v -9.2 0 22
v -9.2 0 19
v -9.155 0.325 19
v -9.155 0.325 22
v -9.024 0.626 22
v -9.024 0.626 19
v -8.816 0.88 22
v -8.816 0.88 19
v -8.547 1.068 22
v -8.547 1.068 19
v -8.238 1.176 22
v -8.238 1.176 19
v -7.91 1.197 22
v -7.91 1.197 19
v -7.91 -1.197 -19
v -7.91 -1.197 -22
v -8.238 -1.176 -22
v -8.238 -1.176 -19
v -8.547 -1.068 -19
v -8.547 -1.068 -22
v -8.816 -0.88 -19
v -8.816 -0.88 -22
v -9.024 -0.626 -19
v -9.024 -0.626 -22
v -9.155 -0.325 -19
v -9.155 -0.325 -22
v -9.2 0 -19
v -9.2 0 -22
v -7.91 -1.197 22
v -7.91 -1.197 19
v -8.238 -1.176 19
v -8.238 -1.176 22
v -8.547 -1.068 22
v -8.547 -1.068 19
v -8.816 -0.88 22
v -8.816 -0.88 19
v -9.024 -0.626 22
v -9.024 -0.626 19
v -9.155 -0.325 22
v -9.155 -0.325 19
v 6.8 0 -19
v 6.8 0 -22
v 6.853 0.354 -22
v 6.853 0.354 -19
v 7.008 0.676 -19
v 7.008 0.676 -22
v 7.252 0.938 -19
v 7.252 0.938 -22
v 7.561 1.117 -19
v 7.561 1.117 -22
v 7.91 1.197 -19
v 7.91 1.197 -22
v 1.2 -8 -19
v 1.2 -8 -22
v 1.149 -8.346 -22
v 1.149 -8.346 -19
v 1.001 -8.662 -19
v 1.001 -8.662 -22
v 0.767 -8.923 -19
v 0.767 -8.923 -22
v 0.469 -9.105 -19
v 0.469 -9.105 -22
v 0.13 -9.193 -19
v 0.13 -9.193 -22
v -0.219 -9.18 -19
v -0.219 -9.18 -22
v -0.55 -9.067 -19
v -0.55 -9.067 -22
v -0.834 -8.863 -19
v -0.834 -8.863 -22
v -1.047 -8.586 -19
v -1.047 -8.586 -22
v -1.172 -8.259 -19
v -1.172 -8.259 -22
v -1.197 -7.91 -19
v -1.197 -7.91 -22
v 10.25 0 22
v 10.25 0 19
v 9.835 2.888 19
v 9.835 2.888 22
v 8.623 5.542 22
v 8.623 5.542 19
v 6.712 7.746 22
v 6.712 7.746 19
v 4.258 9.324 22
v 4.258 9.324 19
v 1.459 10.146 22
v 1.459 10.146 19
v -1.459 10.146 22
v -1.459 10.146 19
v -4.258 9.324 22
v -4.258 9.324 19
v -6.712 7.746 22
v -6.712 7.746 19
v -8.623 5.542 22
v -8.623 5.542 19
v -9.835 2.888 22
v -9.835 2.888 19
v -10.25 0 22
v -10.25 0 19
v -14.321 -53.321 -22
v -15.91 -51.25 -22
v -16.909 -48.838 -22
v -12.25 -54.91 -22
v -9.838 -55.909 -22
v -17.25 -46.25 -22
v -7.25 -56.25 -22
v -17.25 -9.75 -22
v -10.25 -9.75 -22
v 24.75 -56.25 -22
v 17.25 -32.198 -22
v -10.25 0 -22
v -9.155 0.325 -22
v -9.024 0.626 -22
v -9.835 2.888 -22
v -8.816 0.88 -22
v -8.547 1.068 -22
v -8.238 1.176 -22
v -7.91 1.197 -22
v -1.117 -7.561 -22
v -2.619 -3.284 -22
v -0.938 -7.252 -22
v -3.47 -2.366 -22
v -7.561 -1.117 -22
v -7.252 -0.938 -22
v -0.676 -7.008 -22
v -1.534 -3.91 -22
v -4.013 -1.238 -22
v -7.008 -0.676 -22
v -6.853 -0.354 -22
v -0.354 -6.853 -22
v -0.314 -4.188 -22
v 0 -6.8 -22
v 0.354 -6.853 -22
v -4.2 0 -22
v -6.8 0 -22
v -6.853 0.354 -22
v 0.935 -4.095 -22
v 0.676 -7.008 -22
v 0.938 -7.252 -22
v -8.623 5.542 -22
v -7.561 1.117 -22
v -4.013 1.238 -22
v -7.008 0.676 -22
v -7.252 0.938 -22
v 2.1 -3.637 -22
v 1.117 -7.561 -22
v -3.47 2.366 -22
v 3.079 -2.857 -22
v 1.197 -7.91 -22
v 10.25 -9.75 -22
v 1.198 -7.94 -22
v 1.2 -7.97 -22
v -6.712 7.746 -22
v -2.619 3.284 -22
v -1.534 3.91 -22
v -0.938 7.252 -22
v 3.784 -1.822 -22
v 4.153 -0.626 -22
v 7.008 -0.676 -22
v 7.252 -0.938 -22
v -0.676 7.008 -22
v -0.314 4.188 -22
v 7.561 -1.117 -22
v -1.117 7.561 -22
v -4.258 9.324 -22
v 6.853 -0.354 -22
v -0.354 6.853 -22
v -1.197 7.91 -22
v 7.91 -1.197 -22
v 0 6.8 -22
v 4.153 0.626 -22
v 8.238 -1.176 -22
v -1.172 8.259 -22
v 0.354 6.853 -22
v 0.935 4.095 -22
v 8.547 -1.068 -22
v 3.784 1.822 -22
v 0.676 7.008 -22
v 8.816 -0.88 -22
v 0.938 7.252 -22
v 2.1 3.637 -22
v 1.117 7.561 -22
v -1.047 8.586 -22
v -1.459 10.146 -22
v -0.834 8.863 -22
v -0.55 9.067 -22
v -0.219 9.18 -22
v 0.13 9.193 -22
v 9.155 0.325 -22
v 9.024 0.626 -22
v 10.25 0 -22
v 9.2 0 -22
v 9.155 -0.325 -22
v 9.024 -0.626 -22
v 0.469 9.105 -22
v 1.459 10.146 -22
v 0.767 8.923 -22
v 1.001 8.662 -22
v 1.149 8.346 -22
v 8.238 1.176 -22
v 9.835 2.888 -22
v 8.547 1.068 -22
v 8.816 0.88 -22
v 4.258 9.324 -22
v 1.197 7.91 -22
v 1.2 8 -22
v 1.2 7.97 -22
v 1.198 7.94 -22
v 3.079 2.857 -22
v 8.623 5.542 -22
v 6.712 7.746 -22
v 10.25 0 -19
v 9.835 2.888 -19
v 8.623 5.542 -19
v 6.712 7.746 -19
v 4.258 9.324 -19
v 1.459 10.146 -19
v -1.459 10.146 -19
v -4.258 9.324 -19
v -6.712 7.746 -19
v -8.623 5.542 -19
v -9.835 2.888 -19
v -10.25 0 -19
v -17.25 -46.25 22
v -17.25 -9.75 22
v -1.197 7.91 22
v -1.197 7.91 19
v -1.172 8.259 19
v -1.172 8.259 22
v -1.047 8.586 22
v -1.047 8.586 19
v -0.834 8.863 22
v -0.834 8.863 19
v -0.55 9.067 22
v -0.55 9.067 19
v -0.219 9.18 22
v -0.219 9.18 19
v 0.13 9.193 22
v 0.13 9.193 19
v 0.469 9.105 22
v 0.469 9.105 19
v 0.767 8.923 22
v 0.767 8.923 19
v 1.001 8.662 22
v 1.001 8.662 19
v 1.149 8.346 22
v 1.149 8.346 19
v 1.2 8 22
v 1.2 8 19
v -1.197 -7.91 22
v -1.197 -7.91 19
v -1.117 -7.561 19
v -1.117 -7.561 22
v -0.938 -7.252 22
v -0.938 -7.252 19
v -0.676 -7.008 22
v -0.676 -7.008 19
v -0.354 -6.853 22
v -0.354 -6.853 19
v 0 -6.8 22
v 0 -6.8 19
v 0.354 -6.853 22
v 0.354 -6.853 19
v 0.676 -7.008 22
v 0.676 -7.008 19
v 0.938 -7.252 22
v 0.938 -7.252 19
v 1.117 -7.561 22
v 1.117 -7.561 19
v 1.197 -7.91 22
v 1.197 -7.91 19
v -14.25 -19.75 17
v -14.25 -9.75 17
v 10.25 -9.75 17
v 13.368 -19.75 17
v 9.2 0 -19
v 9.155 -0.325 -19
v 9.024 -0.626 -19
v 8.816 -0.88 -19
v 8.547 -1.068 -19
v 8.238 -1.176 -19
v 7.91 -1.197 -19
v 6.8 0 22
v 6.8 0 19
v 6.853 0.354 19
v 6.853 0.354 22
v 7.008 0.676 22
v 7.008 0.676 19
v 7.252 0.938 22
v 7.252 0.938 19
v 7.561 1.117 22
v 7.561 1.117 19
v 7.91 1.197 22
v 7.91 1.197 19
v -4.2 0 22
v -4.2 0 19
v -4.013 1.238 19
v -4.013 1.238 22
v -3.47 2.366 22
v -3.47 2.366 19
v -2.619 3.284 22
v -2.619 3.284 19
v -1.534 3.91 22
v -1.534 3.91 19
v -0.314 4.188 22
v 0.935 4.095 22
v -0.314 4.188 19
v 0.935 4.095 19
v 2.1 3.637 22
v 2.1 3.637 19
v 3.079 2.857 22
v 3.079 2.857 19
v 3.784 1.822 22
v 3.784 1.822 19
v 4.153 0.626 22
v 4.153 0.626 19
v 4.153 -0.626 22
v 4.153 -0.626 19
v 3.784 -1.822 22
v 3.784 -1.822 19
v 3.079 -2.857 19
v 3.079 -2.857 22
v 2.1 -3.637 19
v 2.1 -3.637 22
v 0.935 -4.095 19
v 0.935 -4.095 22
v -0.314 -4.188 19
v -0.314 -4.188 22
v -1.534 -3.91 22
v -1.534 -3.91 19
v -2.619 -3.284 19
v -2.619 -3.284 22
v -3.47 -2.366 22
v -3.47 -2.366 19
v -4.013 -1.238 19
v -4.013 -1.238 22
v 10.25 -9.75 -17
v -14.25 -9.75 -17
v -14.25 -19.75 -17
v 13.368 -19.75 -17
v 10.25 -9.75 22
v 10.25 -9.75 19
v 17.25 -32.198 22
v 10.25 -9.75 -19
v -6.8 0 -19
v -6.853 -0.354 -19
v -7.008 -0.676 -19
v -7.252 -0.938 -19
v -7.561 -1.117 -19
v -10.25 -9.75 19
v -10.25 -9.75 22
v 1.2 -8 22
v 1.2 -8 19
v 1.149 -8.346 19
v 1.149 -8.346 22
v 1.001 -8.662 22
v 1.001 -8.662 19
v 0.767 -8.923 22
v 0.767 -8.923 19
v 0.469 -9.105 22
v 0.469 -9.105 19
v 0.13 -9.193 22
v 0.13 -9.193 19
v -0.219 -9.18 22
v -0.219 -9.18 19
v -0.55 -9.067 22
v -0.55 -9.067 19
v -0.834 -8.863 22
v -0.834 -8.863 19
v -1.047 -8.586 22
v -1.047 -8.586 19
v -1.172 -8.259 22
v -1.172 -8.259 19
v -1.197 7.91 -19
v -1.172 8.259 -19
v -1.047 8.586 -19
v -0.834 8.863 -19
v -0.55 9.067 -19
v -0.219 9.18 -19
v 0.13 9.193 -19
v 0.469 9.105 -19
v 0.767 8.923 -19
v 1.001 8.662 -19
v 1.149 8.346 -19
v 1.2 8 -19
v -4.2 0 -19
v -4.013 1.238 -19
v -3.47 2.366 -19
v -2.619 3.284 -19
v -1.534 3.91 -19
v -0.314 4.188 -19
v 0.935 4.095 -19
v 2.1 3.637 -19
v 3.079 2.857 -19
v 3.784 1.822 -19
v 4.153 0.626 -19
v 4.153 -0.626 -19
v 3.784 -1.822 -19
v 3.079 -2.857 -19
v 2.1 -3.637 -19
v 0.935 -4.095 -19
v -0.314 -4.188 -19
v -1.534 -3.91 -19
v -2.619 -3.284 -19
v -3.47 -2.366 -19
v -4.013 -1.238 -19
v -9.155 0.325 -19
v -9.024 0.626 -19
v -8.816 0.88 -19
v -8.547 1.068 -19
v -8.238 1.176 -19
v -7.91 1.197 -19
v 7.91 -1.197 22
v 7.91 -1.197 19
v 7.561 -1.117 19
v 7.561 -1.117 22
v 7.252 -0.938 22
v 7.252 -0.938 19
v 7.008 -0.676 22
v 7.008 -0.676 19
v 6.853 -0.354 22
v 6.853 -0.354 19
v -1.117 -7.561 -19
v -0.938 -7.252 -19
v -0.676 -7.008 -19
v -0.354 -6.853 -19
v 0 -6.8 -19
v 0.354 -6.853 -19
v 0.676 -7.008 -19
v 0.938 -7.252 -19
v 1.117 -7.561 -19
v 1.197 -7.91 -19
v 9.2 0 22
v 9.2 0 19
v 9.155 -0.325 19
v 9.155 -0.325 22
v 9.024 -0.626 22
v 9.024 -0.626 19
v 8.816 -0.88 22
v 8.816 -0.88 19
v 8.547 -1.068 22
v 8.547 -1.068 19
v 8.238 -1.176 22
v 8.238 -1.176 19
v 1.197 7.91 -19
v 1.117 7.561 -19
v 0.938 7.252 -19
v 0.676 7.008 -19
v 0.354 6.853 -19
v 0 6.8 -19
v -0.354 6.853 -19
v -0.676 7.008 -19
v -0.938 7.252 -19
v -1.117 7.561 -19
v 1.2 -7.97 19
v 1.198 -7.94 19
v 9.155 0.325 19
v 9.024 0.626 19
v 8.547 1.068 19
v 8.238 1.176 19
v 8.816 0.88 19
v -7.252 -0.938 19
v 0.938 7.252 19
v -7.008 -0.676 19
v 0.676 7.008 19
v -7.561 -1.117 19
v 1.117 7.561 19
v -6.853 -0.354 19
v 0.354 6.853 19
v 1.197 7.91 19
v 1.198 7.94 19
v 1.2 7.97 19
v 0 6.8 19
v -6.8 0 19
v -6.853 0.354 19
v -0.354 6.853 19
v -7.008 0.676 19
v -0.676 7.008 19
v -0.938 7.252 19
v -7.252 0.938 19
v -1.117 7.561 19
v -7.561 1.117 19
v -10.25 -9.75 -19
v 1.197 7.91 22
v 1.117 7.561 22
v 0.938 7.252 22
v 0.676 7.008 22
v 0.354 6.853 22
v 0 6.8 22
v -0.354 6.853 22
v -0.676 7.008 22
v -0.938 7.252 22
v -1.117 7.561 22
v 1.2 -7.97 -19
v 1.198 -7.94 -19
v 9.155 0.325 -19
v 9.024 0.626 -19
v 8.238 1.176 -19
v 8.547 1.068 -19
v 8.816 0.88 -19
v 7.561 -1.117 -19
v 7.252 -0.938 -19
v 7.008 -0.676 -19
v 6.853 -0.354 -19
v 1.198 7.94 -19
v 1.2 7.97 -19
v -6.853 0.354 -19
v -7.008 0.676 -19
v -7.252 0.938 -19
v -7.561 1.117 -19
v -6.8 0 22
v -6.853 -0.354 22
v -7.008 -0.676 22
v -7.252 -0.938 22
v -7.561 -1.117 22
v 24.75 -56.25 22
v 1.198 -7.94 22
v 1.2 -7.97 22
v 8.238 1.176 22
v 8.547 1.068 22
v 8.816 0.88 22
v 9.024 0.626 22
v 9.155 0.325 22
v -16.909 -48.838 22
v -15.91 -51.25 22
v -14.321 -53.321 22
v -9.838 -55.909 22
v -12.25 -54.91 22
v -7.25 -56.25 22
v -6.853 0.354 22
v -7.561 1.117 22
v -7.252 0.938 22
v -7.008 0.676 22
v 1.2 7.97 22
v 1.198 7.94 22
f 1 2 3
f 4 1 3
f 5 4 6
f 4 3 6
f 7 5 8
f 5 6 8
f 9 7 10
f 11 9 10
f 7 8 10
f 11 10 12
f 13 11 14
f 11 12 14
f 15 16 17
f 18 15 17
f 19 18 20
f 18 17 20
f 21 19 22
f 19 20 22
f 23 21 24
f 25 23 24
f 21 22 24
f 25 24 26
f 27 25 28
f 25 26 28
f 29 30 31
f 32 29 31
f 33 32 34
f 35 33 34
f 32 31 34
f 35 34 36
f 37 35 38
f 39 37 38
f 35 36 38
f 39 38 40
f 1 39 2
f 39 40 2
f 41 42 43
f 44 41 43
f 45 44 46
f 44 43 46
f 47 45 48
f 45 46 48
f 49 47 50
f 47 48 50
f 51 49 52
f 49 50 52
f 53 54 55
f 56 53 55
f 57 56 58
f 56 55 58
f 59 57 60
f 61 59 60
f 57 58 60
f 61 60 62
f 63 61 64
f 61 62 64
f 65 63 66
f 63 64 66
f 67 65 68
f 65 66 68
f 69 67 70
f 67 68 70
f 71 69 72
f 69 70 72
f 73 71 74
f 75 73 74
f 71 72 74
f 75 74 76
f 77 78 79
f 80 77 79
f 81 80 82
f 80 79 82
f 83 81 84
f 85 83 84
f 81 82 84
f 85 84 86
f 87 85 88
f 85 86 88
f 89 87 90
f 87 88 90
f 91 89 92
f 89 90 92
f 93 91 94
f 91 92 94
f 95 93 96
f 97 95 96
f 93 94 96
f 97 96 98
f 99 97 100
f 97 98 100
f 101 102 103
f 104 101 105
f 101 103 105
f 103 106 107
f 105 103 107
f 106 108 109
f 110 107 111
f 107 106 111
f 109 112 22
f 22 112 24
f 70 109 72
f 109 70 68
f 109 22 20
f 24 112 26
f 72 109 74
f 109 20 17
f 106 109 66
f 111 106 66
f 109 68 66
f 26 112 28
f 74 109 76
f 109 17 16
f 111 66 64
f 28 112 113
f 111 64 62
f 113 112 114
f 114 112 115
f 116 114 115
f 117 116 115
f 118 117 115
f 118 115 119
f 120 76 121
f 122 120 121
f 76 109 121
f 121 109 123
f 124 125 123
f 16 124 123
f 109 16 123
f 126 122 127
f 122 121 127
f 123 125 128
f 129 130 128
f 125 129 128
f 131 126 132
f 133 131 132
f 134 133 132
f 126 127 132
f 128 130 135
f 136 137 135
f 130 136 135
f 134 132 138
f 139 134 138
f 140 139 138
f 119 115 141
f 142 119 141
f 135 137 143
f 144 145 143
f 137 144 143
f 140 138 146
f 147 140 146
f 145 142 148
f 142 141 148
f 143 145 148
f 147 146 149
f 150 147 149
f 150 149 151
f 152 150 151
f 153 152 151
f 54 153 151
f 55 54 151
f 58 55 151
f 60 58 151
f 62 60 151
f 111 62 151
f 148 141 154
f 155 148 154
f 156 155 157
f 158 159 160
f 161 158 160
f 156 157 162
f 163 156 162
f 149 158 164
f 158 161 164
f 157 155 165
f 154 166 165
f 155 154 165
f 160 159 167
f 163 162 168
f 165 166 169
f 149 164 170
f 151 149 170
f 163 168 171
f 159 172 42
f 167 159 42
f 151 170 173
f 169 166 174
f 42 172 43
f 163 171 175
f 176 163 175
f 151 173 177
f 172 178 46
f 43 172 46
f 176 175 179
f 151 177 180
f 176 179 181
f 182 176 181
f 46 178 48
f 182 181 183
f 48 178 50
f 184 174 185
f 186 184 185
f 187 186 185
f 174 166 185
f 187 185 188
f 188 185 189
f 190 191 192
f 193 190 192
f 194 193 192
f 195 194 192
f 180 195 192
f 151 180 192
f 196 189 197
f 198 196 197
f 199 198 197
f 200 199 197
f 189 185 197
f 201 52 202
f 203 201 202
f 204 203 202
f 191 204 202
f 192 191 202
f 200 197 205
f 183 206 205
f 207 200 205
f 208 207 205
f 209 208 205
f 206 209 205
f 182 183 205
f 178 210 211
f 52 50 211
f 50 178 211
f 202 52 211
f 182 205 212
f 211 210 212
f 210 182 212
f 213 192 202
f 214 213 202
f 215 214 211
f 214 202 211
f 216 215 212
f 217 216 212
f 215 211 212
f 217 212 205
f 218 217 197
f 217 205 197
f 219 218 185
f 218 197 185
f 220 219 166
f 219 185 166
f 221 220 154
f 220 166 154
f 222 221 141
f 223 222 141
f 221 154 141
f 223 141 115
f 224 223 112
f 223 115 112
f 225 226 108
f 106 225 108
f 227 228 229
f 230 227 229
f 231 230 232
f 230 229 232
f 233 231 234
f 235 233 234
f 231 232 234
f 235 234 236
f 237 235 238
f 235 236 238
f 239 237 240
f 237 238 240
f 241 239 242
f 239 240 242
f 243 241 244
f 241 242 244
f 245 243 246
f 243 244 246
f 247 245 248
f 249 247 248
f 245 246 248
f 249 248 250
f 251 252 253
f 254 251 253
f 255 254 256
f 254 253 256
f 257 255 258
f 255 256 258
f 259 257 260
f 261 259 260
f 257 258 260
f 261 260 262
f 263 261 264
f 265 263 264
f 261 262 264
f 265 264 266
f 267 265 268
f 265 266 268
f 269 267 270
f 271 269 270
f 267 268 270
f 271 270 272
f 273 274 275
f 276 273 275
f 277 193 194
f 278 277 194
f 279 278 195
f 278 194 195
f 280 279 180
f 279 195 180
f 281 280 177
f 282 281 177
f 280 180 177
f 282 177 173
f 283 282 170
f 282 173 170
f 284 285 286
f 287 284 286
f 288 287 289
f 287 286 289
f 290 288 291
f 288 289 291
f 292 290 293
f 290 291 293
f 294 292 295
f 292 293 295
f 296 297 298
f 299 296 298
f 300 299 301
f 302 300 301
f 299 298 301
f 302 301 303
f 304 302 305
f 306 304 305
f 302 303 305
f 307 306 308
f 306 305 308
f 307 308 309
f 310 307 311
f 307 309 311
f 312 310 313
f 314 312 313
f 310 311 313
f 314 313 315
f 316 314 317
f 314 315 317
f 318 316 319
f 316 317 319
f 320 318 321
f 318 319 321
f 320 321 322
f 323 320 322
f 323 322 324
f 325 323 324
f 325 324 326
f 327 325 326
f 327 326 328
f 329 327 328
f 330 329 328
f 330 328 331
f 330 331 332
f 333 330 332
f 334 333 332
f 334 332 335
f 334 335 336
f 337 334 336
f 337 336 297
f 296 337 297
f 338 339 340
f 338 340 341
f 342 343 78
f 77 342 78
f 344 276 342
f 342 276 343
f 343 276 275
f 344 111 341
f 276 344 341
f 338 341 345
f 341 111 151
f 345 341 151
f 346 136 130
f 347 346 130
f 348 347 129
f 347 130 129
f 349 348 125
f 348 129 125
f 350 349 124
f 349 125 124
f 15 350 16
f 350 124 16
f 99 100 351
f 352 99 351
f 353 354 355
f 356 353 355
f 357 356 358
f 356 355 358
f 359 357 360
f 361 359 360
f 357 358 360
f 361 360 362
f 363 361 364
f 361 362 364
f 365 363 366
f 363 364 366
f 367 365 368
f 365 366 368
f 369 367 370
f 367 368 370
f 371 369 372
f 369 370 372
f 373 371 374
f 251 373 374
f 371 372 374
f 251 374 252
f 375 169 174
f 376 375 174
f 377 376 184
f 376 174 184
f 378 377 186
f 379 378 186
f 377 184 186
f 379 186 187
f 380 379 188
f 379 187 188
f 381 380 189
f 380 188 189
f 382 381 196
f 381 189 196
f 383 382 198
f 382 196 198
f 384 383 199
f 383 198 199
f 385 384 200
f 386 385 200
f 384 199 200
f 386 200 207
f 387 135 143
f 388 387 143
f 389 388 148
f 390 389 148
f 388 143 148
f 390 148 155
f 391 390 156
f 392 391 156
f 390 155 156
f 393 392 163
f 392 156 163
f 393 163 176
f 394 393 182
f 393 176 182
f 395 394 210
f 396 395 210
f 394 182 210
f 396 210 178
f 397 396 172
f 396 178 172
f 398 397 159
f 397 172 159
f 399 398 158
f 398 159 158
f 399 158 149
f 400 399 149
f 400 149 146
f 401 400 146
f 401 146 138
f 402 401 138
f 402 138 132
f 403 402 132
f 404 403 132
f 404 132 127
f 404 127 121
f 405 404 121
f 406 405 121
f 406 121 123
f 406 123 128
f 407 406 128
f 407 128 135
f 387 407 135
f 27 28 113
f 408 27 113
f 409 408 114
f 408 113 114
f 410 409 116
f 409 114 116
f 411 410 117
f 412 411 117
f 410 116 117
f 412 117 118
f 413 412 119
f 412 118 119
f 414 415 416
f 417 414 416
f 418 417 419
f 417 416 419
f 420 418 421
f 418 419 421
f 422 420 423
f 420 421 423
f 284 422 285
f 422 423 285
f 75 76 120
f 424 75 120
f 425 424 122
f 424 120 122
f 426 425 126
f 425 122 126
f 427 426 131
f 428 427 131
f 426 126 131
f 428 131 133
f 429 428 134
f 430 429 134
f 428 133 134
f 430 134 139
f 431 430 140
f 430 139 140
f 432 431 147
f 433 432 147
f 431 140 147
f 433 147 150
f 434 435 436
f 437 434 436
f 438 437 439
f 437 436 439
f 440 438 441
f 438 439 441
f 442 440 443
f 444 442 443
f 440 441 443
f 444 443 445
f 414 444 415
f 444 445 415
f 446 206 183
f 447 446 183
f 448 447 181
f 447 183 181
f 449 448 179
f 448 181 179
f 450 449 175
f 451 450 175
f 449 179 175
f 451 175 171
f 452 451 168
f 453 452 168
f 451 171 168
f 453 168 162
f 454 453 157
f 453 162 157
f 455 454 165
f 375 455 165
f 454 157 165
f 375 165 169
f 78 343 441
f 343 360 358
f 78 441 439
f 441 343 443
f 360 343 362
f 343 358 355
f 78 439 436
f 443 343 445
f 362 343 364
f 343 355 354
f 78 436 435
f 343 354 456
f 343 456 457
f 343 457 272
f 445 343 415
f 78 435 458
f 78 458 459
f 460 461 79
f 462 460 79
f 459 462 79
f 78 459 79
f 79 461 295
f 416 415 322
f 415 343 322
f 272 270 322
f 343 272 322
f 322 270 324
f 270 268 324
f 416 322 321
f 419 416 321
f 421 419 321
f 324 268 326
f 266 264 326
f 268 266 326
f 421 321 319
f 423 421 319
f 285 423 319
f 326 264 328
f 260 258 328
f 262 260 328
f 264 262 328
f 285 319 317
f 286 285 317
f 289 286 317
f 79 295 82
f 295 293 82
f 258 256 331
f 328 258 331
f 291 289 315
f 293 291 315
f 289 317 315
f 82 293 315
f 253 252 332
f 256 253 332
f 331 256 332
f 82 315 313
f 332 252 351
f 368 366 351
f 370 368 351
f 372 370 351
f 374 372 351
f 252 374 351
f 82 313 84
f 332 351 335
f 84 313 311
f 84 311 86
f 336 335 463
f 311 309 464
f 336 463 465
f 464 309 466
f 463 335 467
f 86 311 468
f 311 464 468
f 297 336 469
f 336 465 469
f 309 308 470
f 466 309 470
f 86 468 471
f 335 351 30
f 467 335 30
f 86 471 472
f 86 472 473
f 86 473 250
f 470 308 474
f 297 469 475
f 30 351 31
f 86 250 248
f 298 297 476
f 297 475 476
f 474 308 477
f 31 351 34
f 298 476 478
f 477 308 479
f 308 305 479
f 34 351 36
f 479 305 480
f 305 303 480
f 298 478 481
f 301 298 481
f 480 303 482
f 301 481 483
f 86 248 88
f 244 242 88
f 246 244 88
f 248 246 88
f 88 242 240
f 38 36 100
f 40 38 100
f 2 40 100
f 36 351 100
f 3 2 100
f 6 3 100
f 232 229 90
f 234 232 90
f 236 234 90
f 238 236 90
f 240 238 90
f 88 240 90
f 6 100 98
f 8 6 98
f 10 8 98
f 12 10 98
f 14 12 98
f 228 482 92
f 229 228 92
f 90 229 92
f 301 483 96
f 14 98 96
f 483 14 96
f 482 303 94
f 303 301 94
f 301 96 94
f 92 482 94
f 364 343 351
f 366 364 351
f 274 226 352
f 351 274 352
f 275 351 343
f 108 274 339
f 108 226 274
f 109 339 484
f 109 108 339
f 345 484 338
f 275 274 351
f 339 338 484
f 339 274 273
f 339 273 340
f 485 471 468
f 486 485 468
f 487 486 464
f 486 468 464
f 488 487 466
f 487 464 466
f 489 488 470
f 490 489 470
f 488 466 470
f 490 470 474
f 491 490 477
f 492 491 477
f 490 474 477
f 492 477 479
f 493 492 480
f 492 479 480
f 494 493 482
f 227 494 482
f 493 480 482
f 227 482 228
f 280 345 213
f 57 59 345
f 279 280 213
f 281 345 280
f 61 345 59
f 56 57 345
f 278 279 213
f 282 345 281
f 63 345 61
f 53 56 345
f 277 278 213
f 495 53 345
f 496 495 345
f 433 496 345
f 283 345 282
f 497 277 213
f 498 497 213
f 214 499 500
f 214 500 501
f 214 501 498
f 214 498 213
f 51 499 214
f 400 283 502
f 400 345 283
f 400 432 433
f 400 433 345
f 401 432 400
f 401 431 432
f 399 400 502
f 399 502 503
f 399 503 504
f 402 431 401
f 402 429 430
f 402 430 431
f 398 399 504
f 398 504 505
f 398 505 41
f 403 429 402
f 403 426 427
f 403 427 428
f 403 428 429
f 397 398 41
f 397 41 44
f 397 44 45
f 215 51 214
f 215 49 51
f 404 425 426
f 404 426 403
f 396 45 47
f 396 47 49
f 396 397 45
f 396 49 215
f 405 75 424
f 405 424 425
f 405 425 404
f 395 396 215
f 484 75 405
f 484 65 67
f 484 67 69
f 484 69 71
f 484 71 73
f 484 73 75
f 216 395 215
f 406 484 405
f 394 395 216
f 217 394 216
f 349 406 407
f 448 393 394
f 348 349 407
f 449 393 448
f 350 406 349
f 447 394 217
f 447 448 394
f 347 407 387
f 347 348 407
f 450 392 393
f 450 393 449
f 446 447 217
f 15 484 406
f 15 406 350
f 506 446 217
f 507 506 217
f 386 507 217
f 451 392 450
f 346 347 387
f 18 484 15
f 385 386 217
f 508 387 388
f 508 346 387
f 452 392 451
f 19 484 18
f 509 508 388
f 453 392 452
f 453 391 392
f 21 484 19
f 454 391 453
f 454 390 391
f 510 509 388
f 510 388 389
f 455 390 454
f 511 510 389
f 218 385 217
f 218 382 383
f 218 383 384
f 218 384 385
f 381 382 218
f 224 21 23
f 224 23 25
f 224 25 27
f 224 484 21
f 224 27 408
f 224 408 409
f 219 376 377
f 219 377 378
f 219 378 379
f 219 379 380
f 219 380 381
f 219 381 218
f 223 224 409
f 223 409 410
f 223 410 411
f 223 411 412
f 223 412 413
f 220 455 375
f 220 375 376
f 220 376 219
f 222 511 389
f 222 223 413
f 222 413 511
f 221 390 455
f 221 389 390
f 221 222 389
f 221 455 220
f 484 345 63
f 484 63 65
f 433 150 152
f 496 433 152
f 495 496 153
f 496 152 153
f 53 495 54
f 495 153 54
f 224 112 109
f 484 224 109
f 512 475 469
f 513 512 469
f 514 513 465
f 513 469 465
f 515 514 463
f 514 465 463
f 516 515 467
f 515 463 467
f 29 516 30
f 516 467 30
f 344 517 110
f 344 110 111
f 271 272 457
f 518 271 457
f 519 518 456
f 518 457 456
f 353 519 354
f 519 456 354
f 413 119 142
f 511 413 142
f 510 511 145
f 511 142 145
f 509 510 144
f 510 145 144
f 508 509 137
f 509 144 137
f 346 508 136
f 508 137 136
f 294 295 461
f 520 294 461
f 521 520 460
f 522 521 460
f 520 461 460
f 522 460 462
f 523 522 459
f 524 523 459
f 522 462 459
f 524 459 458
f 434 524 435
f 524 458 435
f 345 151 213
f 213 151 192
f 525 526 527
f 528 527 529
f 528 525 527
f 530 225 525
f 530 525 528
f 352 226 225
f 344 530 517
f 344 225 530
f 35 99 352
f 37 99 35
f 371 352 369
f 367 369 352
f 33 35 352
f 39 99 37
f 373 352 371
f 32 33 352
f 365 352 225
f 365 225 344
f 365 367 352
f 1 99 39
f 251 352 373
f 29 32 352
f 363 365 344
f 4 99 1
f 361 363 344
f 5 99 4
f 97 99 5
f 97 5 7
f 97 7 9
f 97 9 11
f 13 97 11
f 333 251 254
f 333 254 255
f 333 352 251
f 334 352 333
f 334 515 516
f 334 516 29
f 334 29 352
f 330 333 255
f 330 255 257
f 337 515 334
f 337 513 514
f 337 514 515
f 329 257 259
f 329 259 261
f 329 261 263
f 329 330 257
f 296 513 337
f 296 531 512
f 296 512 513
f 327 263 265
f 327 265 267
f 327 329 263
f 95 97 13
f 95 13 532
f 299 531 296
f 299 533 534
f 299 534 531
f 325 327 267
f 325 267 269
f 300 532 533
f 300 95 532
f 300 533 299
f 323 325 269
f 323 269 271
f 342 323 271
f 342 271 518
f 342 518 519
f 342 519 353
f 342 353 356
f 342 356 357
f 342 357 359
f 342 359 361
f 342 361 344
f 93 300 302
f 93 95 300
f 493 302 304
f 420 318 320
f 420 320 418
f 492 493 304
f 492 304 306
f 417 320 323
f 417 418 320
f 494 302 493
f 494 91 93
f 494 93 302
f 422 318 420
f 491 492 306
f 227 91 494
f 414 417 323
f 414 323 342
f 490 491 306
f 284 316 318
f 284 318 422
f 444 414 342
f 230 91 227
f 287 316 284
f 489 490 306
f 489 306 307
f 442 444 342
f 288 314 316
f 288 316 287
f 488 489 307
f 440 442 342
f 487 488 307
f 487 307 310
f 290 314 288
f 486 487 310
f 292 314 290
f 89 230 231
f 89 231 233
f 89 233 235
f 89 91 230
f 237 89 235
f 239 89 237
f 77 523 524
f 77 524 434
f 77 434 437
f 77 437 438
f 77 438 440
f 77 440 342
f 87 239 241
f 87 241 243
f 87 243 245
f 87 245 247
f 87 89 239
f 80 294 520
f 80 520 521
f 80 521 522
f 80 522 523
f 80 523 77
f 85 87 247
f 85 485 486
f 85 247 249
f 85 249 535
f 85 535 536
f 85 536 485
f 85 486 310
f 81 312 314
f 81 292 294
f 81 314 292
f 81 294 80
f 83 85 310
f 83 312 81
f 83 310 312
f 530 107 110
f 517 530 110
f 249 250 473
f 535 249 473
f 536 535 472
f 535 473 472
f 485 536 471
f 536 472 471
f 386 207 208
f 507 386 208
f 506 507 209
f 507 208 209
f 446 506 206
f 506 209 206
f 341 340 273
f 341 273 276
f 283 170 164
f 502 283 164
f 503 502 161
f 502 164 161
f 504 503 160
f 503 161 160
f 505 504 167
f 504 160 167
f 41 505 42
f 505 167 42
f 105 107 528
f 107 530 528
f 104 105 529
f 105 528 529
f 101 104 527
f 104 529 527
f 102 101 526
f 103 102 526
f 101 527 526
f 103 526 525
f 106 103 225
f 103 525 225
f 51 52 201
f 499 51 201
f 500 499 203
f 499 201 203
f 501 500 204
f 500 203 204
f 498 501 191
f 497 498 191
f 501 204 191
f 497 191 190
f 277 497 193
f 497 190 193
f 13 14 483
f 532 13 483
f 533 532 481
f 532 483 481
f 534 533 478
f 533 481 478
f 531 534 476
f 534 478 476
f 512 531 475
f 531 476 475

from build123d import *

# Parameters (mm, degrees)
BOSS_EXTRUDE1_DEPTH      = 22
BOSS_EXTRUDE1_DEPTH_BACK = 22
SKETCH2_W                = 38
SKETCH2_H                = 20
CUT_EXTRUDE1_DEPTH       = 105.423416914
SKETCH3_W                = 7
SKETCH3_H                = 44
BOSS_EXTRUDE2_DEPTH      = 65.5
SKETCH23_R               = 5
SKETCH23_R_2             = 1.2
CUT_EXTRUDE2_DEPTH       = 111.605436123
SKETCH24_W               = 28.5
SKETCH24_H               = 34
CUT_EXTRUDE3_DEPTH       = 90.954502389
SKETCH26_R               = 1.2
SKETCH26_R_2             = 5
SKETCH26_R_3             = 1.45
CUT_EXTRUDE6_DEPTH       = 107.330263801
SKETCH27_W               = 29.7
SKETCH27_H               = 35.2
CUT_EXTRUDE8_DEPTH       = 73.137455597
SKETCH29_W               = 7
SKETCH29_H               = 30
CUT_EXTRUDE10_DEPTH      = 74.468530678
CHAMFER2_SIZE            = 5
BOSS_EXTRUDE4_DEPTH      = 22
BOSS_EXTRUDE4_DEPTH_BACK = 22
SKETCH31_W               = 28.5
SKETCH31_H               = 34
CUT_EXTRUDE11_DEPTH      = 10
FILLET1_R                = 10


with BuildPart() as part:
    # Sketch1 → Boss-Extrude1 (new, two sides: drawn at the far end of the back side and taken through both)
    with BuildSketch(Plane.XY.offset(-BOSS_EXTRUDE1_DEPTH_BACK)):
        with BuildLine():
            Line((10.25, -60), (10.25, 0))
            ThreePointArc((10.25, 0), (0, -10.25), (-10.25, 0))
            Line((-10.25, 0), (-10.25, -60))
            Line((-10.25, -60), (-10.25, -100))
            Line((-10.25, -100), (10.25, -100))
            Line((10.25, -100), (10.25, -60))
        make_face()
        with BuildLine():
            Line((10.25, 0), (9.2, 0))
            ThreePointArc((9.2, 0), (8.816088231, -0.879772698), (7.91, -1.196620241))
            ThreePointArc((7.91, -1.196620241), (5.656854249, -5.656854249), (1.196620241, -7.91))
            ThreePointArc((1.196620241, -7.91), (1.199154762, -7.954968281), (1.2, -8))
            ThreePointArc((1.2, -8), (-0.045031719, -9.199154762), (-1.196620241, -7.91))
            ThreePointArc((-1.196620241, -7.91), (-5.656854249, -5.656854249), (-7.91, -1.196620241))
            ThreePointArc((-7.91, -1.196620241), (-8.816088231, -0.879772698), (-9.2, 0))
            Line((-9.2, 0), (-10.25, 0))
            ThreePointArc((-10.25, 0), (0, -10.25), (10.25, 0))
        make_face()
        with BuildLine():
            ThreePointArc((7.91, -1.196620241), (7.120227302, -0.816088231), (6.8, 0))
            Line((6.8, 0), (4.2, 0))
            ThreePointArc((4.2, 0), (0, -4.2), (-4.2, 0))
            Line((-4.2, 0), (-6.8, 0))
            ThreePointArc((-6.8, 0), (-7.120227302, -0.816088231), (-7.91, -1.196620241))
            ThreePointArc((-7.91, -1.196620241), (-5.656854249, -5.656854249), (-1.196620241, -7.91))
            ThreePointArc((-1.196620241, -7.91), (0, -6.8), (1.196620241, -7.91))
            ThreePointArc((1.196620241, -7.91), (5.656854249, -5.656854249), (7.91, -1.196620241))
        make_face()
        with BuildLine():
            Line((4.2, 0), (6.8, 0))
            ThreePointArc((6.8, 0), (7.120227302, 0.816088231), (7.91, 1.196620241))
            ThreePointArc((7.91, 1.196620241), (5.656854249, 5.656854249), (1.196620241, 7.91))
            ThreePointArc((1.196620241, 7.91), (0, 6.8), (-1.196620241, 7.91))
            ThreePointArc((-1.196620241, 7.91), (-5.656854249, 5.656854249), (-7.91, 1.196620241))
            ThreePointArc((-7.91, 1.196620241), (-7.120227302, 0.816088231), (-6.8, 0))
            Line((-6.8, 0), (-4.2, 0))
            ThreePointArc((-4.2, 0), (0, 4.2), (4.2, 0))
        make_face()
        with BuildLine():
            ThreePointArc((7.91, 1.196620241), (8.816088231, 0.879772698), (9.2, 0))
            Line((9.2, 0), (10.25, 0))
            ThreePointArc((10.25, 0), (0, 10.25), (-10.25, 0))
            Line((-10.25, 0), (-9.2, 0))
            ThreePointArc((-9.2, 0), (-8.816088231, 0.879772698), (-7.91, 1.196620241))
            ThreePointArc((-7.91, 1.196620241), (-5.656854249, 5.656854249), (-1.196620241, 7.91))
            ThreePointArc((-1.196620241, 7.91), (-0.045031719, 9.199154762), (1.2, 8))
            ThreePointArc((1.2, 8), (1.199154762, 7.954968281), (1.196620241, 7.91))
            ThreePointArc((1.196620241, 7.91), (5.656854249, 5.656854249), (7.91, 1.196620241))
        make_face()
    extrude(amount=BOSS_EXTRUDE1_DEPTH + BOSS_EXTRUDE1_DEPTH_BACK)

    # Sketch2 → Cut-Extrude1 (cut, through all)
    with BuildSketch(Plane.ZY.offset(10.25)):
        with Locations((0, 0.25)):
            Rectangle(SKETCH2_W, SKETCH2_H)
    extrude(amount=-CUT_EXTRUDE1_DEPTH, mode=Mode.SUBTRACT)

    # Sketch3 → Boss-Extrude2 (add)
    with BuildSketch(Plane(origin=(0, -9.75, 0), x_dir=(1, 0, 0), z_dir=(0, 1, 0))):
        with Locations((-13.75, 0)):
            Rectangle(SKETCH3_W, SKETCH3_H)
        with Locations((13.75, 0)):
            Rectangle(SKETCH3_W, SKETCH3_H)
    extrude(amount=-BOSS_EXTRUDE2_DEPTH)

    # Sketch23 → Cut-Extrude2 (cut, through all)
    with BuildSketch(Plane.XY.offset(22)):
        with BuildLine():
            Line((-10.25, -100), (10.25, -100))
            Line((10.25, -100), (10.25, -85))
            ThreePointArc((10.25, -85), (0, -95.25), (-10.25, -85))
            Line((-10.25, -85), (-10.25, -100))
        make_face()
        with Locations((0, -85)):
            Circle(SKETCH23_R)
        with Locations((8, -85)):
            Circle(SKETCH23_R_2)
        with Locations((0, -77)):
            Circle(SKETCH23_R_2)
        with Locations((0, -93)):
            Circle(SKETCH23_R_2)
        with Locations((-8, -85)):
            Circle(SKETCH23_R_2)
    extrude(amount=-CUT_EXTRUDE2_DEPTH, mode=Mode.SUBTRACT)

    # Sketch24 → Cut-Extrude3 (cut, through all)
    with BuildSketch(Plane(origin=(0, -9.75, 0), x_dir=(1, 0, 0), z_dir=(0, 1, 0))):
        Rectangle(SKETCH24_W, SKETCH24_H)
    extrude(amount=-CUT_EXTRUDE3_DEPTH, mode=Mode.SUBTRACT)

    # Sketch26 → Cut-Extrude6 (cut, through all)
    # profile 1 of 5: a face of its own
    with BuildSketch(Plane.XY.offset(22)):
        with BuildLine():
            Line((10.25, -75.25), (14.25, -75.25))
            Line((14.25, -75.25), (14.25, -56.53282359))
            Line((14.25, -56.53282359), (14.25, -56.25))
            Line((14.25, -56.25), (-14.25, -56.25))
            Line((-14.25, -56.25), (-14.25, -56.53282359))
            Line((-14.25, -56.53282359), (-14.25, -75.25))
            Line((-14.25, -75.25), (-10.25, -75.25))
            Line((-10.25, -75.25), (-10.25, -85))
            ThreePointArc((-10.25, -85), (0, -95.25), (10.25, -85))
            Line((10.25, -85), (10.25, -75.25))
        make_face()
        with Locations((-8, -85)):
            Circle(SKETCH26_R, mode=Mode.SUBTRACT)
        with Locations((0, -85)):
            Circle(SKETCH26_R_2, mode=Mode.SUBTRACT)
        with Locations((0, -77)):
            Circle(SKETCH26_R, mode=Mode.SUBTRACT)
        with Locations((0, -93)):
            Circle(SKETCH26_R, mode=Mode.SUBTRACT)
        with Locations((8, -85)):
            Circle(SKETCH26_R, mode=Mode.SUBTRACT)
    # profile 2 of 5: a face of its own
    with BuildSketch(Plane.XY.offset(22)):
        Polygon((-17.25, -75.25), (-14.25, -75.25), (-14.25, -56.53282359), (-14.25, -56.25), (-17.25, -56.25), align=None)
    # profile 3 of 5: a face of its own
    with BuildSketch(Plane.XY.offset(22)):
        Polygon((14.25, -56.53282359), (14.25, -75.25), (17.25, -75.25), (17.25, -56.25), (14.25, -56.25), align=None)
    # profile 4 of 5: a face of its own
    with BuildSketch(Plane.XY.offset(22)):
        with Locations((-11, -53)):
            Circle(SKETCH26_R_3)
    # profile 5 of 5: a face of its own
    with BuildSketch(Plane.XY.offset(22)):
        with Locations((11, -53)):
            Circle(SKETCH26_R_3)
    extrude(amount=-CUT_EXTRUDE6_DEPTH, mode=Mode.SUBTRACT)

    # Sketch27 → Cut-Extrude8 (cut, through all)
    with BuildSketch(Plane.XZ.offset(56.25)):
        Rectangle(SKETCH27_W, SKETCH27_H)
    extrude(amount=-CUT_EXTRUDE8_DEPTH, mode=Mode.SUBTRACT)

    # Sketch29 → Cut-Extrude10 (cut, through all)
    with BuildSketch(Plane(origin=(0, 0, -22), x_dir=(-1, 0, 0), z_dir=(0, 0, -1))):
        with Locations((-13.75, -24.75)):
            Rectangle(SKETCH29_W, SKETCH29_H)
    extrude(amount=-CUT_EXTRUDE10_DEPTH, mode=Mode.SUBTRACT)

    # Chamfer2
    # the kernel refuses this chamfer: 5 mm, written as the material it takes off along each edge
    with BuildSketch(Plane(origin=(-17.25, -56.25, 34.85841494), x_dir=(0.9996219169112968, -0.027495876610586327, 0), z_dir=(0, 0, -1))) as chamfer2_piece_1:
        Polygon((CHAMFER2_SIZE * 0.999621916911, -CHAMFER2_SIZE * 0.0274958766106), (-CHAMFER2_SIZE * 0.0274958766106, -CHAMFER2_SIZE * 0.999621916911), (0, 0), align=None)
    extrude(amount=69.71682988, mode=Mode.SUBTRACT)

    # Sketch30 → Boss-Extrude4 (add, two sides: drawn at the far end of the back side and taken through both)
    with BuildSketch(Plane.XY.offset(-BOSS_EXTRUDE4_DEPTH_BACK)):
        Polygon((24.75, -56.25), (17.25, -32.198275862), (17.25, -56.25), align=None)
        Polygon((17.25, -32.198275862), (10.25, -9.75), (-17.25, -9.75), (-17.25, -56.25), (17.25, -56.25), align=None)
    extrude(amount=BOSS_EXTRUDE4_DEPTH + BOSS_EXTRUDE4_DEPTH_BACK)

    # Sketch31 → Cut-Extrude11 (cut)
    with BuildSketch(Plane(origin=(0, -9.75, 0), x_dir=(1, 0, 0), z_dir=(0, 1, 0))):
        Rectangle(SKETCH31_W, SKETCH31_H)
    extrude(amount=-CUT_EXTRUDE11_DEPTH, mode=Mode.SUBTRACT)

    # Fillet1
    fillet1_edges = [part.edges().sort_by_distance(p)[0] for p in [
        (-17.25, -56.25, 0),
    ]]
    fillet(fillet1_edges, radius=FILLET1_R)


solid = part.part
